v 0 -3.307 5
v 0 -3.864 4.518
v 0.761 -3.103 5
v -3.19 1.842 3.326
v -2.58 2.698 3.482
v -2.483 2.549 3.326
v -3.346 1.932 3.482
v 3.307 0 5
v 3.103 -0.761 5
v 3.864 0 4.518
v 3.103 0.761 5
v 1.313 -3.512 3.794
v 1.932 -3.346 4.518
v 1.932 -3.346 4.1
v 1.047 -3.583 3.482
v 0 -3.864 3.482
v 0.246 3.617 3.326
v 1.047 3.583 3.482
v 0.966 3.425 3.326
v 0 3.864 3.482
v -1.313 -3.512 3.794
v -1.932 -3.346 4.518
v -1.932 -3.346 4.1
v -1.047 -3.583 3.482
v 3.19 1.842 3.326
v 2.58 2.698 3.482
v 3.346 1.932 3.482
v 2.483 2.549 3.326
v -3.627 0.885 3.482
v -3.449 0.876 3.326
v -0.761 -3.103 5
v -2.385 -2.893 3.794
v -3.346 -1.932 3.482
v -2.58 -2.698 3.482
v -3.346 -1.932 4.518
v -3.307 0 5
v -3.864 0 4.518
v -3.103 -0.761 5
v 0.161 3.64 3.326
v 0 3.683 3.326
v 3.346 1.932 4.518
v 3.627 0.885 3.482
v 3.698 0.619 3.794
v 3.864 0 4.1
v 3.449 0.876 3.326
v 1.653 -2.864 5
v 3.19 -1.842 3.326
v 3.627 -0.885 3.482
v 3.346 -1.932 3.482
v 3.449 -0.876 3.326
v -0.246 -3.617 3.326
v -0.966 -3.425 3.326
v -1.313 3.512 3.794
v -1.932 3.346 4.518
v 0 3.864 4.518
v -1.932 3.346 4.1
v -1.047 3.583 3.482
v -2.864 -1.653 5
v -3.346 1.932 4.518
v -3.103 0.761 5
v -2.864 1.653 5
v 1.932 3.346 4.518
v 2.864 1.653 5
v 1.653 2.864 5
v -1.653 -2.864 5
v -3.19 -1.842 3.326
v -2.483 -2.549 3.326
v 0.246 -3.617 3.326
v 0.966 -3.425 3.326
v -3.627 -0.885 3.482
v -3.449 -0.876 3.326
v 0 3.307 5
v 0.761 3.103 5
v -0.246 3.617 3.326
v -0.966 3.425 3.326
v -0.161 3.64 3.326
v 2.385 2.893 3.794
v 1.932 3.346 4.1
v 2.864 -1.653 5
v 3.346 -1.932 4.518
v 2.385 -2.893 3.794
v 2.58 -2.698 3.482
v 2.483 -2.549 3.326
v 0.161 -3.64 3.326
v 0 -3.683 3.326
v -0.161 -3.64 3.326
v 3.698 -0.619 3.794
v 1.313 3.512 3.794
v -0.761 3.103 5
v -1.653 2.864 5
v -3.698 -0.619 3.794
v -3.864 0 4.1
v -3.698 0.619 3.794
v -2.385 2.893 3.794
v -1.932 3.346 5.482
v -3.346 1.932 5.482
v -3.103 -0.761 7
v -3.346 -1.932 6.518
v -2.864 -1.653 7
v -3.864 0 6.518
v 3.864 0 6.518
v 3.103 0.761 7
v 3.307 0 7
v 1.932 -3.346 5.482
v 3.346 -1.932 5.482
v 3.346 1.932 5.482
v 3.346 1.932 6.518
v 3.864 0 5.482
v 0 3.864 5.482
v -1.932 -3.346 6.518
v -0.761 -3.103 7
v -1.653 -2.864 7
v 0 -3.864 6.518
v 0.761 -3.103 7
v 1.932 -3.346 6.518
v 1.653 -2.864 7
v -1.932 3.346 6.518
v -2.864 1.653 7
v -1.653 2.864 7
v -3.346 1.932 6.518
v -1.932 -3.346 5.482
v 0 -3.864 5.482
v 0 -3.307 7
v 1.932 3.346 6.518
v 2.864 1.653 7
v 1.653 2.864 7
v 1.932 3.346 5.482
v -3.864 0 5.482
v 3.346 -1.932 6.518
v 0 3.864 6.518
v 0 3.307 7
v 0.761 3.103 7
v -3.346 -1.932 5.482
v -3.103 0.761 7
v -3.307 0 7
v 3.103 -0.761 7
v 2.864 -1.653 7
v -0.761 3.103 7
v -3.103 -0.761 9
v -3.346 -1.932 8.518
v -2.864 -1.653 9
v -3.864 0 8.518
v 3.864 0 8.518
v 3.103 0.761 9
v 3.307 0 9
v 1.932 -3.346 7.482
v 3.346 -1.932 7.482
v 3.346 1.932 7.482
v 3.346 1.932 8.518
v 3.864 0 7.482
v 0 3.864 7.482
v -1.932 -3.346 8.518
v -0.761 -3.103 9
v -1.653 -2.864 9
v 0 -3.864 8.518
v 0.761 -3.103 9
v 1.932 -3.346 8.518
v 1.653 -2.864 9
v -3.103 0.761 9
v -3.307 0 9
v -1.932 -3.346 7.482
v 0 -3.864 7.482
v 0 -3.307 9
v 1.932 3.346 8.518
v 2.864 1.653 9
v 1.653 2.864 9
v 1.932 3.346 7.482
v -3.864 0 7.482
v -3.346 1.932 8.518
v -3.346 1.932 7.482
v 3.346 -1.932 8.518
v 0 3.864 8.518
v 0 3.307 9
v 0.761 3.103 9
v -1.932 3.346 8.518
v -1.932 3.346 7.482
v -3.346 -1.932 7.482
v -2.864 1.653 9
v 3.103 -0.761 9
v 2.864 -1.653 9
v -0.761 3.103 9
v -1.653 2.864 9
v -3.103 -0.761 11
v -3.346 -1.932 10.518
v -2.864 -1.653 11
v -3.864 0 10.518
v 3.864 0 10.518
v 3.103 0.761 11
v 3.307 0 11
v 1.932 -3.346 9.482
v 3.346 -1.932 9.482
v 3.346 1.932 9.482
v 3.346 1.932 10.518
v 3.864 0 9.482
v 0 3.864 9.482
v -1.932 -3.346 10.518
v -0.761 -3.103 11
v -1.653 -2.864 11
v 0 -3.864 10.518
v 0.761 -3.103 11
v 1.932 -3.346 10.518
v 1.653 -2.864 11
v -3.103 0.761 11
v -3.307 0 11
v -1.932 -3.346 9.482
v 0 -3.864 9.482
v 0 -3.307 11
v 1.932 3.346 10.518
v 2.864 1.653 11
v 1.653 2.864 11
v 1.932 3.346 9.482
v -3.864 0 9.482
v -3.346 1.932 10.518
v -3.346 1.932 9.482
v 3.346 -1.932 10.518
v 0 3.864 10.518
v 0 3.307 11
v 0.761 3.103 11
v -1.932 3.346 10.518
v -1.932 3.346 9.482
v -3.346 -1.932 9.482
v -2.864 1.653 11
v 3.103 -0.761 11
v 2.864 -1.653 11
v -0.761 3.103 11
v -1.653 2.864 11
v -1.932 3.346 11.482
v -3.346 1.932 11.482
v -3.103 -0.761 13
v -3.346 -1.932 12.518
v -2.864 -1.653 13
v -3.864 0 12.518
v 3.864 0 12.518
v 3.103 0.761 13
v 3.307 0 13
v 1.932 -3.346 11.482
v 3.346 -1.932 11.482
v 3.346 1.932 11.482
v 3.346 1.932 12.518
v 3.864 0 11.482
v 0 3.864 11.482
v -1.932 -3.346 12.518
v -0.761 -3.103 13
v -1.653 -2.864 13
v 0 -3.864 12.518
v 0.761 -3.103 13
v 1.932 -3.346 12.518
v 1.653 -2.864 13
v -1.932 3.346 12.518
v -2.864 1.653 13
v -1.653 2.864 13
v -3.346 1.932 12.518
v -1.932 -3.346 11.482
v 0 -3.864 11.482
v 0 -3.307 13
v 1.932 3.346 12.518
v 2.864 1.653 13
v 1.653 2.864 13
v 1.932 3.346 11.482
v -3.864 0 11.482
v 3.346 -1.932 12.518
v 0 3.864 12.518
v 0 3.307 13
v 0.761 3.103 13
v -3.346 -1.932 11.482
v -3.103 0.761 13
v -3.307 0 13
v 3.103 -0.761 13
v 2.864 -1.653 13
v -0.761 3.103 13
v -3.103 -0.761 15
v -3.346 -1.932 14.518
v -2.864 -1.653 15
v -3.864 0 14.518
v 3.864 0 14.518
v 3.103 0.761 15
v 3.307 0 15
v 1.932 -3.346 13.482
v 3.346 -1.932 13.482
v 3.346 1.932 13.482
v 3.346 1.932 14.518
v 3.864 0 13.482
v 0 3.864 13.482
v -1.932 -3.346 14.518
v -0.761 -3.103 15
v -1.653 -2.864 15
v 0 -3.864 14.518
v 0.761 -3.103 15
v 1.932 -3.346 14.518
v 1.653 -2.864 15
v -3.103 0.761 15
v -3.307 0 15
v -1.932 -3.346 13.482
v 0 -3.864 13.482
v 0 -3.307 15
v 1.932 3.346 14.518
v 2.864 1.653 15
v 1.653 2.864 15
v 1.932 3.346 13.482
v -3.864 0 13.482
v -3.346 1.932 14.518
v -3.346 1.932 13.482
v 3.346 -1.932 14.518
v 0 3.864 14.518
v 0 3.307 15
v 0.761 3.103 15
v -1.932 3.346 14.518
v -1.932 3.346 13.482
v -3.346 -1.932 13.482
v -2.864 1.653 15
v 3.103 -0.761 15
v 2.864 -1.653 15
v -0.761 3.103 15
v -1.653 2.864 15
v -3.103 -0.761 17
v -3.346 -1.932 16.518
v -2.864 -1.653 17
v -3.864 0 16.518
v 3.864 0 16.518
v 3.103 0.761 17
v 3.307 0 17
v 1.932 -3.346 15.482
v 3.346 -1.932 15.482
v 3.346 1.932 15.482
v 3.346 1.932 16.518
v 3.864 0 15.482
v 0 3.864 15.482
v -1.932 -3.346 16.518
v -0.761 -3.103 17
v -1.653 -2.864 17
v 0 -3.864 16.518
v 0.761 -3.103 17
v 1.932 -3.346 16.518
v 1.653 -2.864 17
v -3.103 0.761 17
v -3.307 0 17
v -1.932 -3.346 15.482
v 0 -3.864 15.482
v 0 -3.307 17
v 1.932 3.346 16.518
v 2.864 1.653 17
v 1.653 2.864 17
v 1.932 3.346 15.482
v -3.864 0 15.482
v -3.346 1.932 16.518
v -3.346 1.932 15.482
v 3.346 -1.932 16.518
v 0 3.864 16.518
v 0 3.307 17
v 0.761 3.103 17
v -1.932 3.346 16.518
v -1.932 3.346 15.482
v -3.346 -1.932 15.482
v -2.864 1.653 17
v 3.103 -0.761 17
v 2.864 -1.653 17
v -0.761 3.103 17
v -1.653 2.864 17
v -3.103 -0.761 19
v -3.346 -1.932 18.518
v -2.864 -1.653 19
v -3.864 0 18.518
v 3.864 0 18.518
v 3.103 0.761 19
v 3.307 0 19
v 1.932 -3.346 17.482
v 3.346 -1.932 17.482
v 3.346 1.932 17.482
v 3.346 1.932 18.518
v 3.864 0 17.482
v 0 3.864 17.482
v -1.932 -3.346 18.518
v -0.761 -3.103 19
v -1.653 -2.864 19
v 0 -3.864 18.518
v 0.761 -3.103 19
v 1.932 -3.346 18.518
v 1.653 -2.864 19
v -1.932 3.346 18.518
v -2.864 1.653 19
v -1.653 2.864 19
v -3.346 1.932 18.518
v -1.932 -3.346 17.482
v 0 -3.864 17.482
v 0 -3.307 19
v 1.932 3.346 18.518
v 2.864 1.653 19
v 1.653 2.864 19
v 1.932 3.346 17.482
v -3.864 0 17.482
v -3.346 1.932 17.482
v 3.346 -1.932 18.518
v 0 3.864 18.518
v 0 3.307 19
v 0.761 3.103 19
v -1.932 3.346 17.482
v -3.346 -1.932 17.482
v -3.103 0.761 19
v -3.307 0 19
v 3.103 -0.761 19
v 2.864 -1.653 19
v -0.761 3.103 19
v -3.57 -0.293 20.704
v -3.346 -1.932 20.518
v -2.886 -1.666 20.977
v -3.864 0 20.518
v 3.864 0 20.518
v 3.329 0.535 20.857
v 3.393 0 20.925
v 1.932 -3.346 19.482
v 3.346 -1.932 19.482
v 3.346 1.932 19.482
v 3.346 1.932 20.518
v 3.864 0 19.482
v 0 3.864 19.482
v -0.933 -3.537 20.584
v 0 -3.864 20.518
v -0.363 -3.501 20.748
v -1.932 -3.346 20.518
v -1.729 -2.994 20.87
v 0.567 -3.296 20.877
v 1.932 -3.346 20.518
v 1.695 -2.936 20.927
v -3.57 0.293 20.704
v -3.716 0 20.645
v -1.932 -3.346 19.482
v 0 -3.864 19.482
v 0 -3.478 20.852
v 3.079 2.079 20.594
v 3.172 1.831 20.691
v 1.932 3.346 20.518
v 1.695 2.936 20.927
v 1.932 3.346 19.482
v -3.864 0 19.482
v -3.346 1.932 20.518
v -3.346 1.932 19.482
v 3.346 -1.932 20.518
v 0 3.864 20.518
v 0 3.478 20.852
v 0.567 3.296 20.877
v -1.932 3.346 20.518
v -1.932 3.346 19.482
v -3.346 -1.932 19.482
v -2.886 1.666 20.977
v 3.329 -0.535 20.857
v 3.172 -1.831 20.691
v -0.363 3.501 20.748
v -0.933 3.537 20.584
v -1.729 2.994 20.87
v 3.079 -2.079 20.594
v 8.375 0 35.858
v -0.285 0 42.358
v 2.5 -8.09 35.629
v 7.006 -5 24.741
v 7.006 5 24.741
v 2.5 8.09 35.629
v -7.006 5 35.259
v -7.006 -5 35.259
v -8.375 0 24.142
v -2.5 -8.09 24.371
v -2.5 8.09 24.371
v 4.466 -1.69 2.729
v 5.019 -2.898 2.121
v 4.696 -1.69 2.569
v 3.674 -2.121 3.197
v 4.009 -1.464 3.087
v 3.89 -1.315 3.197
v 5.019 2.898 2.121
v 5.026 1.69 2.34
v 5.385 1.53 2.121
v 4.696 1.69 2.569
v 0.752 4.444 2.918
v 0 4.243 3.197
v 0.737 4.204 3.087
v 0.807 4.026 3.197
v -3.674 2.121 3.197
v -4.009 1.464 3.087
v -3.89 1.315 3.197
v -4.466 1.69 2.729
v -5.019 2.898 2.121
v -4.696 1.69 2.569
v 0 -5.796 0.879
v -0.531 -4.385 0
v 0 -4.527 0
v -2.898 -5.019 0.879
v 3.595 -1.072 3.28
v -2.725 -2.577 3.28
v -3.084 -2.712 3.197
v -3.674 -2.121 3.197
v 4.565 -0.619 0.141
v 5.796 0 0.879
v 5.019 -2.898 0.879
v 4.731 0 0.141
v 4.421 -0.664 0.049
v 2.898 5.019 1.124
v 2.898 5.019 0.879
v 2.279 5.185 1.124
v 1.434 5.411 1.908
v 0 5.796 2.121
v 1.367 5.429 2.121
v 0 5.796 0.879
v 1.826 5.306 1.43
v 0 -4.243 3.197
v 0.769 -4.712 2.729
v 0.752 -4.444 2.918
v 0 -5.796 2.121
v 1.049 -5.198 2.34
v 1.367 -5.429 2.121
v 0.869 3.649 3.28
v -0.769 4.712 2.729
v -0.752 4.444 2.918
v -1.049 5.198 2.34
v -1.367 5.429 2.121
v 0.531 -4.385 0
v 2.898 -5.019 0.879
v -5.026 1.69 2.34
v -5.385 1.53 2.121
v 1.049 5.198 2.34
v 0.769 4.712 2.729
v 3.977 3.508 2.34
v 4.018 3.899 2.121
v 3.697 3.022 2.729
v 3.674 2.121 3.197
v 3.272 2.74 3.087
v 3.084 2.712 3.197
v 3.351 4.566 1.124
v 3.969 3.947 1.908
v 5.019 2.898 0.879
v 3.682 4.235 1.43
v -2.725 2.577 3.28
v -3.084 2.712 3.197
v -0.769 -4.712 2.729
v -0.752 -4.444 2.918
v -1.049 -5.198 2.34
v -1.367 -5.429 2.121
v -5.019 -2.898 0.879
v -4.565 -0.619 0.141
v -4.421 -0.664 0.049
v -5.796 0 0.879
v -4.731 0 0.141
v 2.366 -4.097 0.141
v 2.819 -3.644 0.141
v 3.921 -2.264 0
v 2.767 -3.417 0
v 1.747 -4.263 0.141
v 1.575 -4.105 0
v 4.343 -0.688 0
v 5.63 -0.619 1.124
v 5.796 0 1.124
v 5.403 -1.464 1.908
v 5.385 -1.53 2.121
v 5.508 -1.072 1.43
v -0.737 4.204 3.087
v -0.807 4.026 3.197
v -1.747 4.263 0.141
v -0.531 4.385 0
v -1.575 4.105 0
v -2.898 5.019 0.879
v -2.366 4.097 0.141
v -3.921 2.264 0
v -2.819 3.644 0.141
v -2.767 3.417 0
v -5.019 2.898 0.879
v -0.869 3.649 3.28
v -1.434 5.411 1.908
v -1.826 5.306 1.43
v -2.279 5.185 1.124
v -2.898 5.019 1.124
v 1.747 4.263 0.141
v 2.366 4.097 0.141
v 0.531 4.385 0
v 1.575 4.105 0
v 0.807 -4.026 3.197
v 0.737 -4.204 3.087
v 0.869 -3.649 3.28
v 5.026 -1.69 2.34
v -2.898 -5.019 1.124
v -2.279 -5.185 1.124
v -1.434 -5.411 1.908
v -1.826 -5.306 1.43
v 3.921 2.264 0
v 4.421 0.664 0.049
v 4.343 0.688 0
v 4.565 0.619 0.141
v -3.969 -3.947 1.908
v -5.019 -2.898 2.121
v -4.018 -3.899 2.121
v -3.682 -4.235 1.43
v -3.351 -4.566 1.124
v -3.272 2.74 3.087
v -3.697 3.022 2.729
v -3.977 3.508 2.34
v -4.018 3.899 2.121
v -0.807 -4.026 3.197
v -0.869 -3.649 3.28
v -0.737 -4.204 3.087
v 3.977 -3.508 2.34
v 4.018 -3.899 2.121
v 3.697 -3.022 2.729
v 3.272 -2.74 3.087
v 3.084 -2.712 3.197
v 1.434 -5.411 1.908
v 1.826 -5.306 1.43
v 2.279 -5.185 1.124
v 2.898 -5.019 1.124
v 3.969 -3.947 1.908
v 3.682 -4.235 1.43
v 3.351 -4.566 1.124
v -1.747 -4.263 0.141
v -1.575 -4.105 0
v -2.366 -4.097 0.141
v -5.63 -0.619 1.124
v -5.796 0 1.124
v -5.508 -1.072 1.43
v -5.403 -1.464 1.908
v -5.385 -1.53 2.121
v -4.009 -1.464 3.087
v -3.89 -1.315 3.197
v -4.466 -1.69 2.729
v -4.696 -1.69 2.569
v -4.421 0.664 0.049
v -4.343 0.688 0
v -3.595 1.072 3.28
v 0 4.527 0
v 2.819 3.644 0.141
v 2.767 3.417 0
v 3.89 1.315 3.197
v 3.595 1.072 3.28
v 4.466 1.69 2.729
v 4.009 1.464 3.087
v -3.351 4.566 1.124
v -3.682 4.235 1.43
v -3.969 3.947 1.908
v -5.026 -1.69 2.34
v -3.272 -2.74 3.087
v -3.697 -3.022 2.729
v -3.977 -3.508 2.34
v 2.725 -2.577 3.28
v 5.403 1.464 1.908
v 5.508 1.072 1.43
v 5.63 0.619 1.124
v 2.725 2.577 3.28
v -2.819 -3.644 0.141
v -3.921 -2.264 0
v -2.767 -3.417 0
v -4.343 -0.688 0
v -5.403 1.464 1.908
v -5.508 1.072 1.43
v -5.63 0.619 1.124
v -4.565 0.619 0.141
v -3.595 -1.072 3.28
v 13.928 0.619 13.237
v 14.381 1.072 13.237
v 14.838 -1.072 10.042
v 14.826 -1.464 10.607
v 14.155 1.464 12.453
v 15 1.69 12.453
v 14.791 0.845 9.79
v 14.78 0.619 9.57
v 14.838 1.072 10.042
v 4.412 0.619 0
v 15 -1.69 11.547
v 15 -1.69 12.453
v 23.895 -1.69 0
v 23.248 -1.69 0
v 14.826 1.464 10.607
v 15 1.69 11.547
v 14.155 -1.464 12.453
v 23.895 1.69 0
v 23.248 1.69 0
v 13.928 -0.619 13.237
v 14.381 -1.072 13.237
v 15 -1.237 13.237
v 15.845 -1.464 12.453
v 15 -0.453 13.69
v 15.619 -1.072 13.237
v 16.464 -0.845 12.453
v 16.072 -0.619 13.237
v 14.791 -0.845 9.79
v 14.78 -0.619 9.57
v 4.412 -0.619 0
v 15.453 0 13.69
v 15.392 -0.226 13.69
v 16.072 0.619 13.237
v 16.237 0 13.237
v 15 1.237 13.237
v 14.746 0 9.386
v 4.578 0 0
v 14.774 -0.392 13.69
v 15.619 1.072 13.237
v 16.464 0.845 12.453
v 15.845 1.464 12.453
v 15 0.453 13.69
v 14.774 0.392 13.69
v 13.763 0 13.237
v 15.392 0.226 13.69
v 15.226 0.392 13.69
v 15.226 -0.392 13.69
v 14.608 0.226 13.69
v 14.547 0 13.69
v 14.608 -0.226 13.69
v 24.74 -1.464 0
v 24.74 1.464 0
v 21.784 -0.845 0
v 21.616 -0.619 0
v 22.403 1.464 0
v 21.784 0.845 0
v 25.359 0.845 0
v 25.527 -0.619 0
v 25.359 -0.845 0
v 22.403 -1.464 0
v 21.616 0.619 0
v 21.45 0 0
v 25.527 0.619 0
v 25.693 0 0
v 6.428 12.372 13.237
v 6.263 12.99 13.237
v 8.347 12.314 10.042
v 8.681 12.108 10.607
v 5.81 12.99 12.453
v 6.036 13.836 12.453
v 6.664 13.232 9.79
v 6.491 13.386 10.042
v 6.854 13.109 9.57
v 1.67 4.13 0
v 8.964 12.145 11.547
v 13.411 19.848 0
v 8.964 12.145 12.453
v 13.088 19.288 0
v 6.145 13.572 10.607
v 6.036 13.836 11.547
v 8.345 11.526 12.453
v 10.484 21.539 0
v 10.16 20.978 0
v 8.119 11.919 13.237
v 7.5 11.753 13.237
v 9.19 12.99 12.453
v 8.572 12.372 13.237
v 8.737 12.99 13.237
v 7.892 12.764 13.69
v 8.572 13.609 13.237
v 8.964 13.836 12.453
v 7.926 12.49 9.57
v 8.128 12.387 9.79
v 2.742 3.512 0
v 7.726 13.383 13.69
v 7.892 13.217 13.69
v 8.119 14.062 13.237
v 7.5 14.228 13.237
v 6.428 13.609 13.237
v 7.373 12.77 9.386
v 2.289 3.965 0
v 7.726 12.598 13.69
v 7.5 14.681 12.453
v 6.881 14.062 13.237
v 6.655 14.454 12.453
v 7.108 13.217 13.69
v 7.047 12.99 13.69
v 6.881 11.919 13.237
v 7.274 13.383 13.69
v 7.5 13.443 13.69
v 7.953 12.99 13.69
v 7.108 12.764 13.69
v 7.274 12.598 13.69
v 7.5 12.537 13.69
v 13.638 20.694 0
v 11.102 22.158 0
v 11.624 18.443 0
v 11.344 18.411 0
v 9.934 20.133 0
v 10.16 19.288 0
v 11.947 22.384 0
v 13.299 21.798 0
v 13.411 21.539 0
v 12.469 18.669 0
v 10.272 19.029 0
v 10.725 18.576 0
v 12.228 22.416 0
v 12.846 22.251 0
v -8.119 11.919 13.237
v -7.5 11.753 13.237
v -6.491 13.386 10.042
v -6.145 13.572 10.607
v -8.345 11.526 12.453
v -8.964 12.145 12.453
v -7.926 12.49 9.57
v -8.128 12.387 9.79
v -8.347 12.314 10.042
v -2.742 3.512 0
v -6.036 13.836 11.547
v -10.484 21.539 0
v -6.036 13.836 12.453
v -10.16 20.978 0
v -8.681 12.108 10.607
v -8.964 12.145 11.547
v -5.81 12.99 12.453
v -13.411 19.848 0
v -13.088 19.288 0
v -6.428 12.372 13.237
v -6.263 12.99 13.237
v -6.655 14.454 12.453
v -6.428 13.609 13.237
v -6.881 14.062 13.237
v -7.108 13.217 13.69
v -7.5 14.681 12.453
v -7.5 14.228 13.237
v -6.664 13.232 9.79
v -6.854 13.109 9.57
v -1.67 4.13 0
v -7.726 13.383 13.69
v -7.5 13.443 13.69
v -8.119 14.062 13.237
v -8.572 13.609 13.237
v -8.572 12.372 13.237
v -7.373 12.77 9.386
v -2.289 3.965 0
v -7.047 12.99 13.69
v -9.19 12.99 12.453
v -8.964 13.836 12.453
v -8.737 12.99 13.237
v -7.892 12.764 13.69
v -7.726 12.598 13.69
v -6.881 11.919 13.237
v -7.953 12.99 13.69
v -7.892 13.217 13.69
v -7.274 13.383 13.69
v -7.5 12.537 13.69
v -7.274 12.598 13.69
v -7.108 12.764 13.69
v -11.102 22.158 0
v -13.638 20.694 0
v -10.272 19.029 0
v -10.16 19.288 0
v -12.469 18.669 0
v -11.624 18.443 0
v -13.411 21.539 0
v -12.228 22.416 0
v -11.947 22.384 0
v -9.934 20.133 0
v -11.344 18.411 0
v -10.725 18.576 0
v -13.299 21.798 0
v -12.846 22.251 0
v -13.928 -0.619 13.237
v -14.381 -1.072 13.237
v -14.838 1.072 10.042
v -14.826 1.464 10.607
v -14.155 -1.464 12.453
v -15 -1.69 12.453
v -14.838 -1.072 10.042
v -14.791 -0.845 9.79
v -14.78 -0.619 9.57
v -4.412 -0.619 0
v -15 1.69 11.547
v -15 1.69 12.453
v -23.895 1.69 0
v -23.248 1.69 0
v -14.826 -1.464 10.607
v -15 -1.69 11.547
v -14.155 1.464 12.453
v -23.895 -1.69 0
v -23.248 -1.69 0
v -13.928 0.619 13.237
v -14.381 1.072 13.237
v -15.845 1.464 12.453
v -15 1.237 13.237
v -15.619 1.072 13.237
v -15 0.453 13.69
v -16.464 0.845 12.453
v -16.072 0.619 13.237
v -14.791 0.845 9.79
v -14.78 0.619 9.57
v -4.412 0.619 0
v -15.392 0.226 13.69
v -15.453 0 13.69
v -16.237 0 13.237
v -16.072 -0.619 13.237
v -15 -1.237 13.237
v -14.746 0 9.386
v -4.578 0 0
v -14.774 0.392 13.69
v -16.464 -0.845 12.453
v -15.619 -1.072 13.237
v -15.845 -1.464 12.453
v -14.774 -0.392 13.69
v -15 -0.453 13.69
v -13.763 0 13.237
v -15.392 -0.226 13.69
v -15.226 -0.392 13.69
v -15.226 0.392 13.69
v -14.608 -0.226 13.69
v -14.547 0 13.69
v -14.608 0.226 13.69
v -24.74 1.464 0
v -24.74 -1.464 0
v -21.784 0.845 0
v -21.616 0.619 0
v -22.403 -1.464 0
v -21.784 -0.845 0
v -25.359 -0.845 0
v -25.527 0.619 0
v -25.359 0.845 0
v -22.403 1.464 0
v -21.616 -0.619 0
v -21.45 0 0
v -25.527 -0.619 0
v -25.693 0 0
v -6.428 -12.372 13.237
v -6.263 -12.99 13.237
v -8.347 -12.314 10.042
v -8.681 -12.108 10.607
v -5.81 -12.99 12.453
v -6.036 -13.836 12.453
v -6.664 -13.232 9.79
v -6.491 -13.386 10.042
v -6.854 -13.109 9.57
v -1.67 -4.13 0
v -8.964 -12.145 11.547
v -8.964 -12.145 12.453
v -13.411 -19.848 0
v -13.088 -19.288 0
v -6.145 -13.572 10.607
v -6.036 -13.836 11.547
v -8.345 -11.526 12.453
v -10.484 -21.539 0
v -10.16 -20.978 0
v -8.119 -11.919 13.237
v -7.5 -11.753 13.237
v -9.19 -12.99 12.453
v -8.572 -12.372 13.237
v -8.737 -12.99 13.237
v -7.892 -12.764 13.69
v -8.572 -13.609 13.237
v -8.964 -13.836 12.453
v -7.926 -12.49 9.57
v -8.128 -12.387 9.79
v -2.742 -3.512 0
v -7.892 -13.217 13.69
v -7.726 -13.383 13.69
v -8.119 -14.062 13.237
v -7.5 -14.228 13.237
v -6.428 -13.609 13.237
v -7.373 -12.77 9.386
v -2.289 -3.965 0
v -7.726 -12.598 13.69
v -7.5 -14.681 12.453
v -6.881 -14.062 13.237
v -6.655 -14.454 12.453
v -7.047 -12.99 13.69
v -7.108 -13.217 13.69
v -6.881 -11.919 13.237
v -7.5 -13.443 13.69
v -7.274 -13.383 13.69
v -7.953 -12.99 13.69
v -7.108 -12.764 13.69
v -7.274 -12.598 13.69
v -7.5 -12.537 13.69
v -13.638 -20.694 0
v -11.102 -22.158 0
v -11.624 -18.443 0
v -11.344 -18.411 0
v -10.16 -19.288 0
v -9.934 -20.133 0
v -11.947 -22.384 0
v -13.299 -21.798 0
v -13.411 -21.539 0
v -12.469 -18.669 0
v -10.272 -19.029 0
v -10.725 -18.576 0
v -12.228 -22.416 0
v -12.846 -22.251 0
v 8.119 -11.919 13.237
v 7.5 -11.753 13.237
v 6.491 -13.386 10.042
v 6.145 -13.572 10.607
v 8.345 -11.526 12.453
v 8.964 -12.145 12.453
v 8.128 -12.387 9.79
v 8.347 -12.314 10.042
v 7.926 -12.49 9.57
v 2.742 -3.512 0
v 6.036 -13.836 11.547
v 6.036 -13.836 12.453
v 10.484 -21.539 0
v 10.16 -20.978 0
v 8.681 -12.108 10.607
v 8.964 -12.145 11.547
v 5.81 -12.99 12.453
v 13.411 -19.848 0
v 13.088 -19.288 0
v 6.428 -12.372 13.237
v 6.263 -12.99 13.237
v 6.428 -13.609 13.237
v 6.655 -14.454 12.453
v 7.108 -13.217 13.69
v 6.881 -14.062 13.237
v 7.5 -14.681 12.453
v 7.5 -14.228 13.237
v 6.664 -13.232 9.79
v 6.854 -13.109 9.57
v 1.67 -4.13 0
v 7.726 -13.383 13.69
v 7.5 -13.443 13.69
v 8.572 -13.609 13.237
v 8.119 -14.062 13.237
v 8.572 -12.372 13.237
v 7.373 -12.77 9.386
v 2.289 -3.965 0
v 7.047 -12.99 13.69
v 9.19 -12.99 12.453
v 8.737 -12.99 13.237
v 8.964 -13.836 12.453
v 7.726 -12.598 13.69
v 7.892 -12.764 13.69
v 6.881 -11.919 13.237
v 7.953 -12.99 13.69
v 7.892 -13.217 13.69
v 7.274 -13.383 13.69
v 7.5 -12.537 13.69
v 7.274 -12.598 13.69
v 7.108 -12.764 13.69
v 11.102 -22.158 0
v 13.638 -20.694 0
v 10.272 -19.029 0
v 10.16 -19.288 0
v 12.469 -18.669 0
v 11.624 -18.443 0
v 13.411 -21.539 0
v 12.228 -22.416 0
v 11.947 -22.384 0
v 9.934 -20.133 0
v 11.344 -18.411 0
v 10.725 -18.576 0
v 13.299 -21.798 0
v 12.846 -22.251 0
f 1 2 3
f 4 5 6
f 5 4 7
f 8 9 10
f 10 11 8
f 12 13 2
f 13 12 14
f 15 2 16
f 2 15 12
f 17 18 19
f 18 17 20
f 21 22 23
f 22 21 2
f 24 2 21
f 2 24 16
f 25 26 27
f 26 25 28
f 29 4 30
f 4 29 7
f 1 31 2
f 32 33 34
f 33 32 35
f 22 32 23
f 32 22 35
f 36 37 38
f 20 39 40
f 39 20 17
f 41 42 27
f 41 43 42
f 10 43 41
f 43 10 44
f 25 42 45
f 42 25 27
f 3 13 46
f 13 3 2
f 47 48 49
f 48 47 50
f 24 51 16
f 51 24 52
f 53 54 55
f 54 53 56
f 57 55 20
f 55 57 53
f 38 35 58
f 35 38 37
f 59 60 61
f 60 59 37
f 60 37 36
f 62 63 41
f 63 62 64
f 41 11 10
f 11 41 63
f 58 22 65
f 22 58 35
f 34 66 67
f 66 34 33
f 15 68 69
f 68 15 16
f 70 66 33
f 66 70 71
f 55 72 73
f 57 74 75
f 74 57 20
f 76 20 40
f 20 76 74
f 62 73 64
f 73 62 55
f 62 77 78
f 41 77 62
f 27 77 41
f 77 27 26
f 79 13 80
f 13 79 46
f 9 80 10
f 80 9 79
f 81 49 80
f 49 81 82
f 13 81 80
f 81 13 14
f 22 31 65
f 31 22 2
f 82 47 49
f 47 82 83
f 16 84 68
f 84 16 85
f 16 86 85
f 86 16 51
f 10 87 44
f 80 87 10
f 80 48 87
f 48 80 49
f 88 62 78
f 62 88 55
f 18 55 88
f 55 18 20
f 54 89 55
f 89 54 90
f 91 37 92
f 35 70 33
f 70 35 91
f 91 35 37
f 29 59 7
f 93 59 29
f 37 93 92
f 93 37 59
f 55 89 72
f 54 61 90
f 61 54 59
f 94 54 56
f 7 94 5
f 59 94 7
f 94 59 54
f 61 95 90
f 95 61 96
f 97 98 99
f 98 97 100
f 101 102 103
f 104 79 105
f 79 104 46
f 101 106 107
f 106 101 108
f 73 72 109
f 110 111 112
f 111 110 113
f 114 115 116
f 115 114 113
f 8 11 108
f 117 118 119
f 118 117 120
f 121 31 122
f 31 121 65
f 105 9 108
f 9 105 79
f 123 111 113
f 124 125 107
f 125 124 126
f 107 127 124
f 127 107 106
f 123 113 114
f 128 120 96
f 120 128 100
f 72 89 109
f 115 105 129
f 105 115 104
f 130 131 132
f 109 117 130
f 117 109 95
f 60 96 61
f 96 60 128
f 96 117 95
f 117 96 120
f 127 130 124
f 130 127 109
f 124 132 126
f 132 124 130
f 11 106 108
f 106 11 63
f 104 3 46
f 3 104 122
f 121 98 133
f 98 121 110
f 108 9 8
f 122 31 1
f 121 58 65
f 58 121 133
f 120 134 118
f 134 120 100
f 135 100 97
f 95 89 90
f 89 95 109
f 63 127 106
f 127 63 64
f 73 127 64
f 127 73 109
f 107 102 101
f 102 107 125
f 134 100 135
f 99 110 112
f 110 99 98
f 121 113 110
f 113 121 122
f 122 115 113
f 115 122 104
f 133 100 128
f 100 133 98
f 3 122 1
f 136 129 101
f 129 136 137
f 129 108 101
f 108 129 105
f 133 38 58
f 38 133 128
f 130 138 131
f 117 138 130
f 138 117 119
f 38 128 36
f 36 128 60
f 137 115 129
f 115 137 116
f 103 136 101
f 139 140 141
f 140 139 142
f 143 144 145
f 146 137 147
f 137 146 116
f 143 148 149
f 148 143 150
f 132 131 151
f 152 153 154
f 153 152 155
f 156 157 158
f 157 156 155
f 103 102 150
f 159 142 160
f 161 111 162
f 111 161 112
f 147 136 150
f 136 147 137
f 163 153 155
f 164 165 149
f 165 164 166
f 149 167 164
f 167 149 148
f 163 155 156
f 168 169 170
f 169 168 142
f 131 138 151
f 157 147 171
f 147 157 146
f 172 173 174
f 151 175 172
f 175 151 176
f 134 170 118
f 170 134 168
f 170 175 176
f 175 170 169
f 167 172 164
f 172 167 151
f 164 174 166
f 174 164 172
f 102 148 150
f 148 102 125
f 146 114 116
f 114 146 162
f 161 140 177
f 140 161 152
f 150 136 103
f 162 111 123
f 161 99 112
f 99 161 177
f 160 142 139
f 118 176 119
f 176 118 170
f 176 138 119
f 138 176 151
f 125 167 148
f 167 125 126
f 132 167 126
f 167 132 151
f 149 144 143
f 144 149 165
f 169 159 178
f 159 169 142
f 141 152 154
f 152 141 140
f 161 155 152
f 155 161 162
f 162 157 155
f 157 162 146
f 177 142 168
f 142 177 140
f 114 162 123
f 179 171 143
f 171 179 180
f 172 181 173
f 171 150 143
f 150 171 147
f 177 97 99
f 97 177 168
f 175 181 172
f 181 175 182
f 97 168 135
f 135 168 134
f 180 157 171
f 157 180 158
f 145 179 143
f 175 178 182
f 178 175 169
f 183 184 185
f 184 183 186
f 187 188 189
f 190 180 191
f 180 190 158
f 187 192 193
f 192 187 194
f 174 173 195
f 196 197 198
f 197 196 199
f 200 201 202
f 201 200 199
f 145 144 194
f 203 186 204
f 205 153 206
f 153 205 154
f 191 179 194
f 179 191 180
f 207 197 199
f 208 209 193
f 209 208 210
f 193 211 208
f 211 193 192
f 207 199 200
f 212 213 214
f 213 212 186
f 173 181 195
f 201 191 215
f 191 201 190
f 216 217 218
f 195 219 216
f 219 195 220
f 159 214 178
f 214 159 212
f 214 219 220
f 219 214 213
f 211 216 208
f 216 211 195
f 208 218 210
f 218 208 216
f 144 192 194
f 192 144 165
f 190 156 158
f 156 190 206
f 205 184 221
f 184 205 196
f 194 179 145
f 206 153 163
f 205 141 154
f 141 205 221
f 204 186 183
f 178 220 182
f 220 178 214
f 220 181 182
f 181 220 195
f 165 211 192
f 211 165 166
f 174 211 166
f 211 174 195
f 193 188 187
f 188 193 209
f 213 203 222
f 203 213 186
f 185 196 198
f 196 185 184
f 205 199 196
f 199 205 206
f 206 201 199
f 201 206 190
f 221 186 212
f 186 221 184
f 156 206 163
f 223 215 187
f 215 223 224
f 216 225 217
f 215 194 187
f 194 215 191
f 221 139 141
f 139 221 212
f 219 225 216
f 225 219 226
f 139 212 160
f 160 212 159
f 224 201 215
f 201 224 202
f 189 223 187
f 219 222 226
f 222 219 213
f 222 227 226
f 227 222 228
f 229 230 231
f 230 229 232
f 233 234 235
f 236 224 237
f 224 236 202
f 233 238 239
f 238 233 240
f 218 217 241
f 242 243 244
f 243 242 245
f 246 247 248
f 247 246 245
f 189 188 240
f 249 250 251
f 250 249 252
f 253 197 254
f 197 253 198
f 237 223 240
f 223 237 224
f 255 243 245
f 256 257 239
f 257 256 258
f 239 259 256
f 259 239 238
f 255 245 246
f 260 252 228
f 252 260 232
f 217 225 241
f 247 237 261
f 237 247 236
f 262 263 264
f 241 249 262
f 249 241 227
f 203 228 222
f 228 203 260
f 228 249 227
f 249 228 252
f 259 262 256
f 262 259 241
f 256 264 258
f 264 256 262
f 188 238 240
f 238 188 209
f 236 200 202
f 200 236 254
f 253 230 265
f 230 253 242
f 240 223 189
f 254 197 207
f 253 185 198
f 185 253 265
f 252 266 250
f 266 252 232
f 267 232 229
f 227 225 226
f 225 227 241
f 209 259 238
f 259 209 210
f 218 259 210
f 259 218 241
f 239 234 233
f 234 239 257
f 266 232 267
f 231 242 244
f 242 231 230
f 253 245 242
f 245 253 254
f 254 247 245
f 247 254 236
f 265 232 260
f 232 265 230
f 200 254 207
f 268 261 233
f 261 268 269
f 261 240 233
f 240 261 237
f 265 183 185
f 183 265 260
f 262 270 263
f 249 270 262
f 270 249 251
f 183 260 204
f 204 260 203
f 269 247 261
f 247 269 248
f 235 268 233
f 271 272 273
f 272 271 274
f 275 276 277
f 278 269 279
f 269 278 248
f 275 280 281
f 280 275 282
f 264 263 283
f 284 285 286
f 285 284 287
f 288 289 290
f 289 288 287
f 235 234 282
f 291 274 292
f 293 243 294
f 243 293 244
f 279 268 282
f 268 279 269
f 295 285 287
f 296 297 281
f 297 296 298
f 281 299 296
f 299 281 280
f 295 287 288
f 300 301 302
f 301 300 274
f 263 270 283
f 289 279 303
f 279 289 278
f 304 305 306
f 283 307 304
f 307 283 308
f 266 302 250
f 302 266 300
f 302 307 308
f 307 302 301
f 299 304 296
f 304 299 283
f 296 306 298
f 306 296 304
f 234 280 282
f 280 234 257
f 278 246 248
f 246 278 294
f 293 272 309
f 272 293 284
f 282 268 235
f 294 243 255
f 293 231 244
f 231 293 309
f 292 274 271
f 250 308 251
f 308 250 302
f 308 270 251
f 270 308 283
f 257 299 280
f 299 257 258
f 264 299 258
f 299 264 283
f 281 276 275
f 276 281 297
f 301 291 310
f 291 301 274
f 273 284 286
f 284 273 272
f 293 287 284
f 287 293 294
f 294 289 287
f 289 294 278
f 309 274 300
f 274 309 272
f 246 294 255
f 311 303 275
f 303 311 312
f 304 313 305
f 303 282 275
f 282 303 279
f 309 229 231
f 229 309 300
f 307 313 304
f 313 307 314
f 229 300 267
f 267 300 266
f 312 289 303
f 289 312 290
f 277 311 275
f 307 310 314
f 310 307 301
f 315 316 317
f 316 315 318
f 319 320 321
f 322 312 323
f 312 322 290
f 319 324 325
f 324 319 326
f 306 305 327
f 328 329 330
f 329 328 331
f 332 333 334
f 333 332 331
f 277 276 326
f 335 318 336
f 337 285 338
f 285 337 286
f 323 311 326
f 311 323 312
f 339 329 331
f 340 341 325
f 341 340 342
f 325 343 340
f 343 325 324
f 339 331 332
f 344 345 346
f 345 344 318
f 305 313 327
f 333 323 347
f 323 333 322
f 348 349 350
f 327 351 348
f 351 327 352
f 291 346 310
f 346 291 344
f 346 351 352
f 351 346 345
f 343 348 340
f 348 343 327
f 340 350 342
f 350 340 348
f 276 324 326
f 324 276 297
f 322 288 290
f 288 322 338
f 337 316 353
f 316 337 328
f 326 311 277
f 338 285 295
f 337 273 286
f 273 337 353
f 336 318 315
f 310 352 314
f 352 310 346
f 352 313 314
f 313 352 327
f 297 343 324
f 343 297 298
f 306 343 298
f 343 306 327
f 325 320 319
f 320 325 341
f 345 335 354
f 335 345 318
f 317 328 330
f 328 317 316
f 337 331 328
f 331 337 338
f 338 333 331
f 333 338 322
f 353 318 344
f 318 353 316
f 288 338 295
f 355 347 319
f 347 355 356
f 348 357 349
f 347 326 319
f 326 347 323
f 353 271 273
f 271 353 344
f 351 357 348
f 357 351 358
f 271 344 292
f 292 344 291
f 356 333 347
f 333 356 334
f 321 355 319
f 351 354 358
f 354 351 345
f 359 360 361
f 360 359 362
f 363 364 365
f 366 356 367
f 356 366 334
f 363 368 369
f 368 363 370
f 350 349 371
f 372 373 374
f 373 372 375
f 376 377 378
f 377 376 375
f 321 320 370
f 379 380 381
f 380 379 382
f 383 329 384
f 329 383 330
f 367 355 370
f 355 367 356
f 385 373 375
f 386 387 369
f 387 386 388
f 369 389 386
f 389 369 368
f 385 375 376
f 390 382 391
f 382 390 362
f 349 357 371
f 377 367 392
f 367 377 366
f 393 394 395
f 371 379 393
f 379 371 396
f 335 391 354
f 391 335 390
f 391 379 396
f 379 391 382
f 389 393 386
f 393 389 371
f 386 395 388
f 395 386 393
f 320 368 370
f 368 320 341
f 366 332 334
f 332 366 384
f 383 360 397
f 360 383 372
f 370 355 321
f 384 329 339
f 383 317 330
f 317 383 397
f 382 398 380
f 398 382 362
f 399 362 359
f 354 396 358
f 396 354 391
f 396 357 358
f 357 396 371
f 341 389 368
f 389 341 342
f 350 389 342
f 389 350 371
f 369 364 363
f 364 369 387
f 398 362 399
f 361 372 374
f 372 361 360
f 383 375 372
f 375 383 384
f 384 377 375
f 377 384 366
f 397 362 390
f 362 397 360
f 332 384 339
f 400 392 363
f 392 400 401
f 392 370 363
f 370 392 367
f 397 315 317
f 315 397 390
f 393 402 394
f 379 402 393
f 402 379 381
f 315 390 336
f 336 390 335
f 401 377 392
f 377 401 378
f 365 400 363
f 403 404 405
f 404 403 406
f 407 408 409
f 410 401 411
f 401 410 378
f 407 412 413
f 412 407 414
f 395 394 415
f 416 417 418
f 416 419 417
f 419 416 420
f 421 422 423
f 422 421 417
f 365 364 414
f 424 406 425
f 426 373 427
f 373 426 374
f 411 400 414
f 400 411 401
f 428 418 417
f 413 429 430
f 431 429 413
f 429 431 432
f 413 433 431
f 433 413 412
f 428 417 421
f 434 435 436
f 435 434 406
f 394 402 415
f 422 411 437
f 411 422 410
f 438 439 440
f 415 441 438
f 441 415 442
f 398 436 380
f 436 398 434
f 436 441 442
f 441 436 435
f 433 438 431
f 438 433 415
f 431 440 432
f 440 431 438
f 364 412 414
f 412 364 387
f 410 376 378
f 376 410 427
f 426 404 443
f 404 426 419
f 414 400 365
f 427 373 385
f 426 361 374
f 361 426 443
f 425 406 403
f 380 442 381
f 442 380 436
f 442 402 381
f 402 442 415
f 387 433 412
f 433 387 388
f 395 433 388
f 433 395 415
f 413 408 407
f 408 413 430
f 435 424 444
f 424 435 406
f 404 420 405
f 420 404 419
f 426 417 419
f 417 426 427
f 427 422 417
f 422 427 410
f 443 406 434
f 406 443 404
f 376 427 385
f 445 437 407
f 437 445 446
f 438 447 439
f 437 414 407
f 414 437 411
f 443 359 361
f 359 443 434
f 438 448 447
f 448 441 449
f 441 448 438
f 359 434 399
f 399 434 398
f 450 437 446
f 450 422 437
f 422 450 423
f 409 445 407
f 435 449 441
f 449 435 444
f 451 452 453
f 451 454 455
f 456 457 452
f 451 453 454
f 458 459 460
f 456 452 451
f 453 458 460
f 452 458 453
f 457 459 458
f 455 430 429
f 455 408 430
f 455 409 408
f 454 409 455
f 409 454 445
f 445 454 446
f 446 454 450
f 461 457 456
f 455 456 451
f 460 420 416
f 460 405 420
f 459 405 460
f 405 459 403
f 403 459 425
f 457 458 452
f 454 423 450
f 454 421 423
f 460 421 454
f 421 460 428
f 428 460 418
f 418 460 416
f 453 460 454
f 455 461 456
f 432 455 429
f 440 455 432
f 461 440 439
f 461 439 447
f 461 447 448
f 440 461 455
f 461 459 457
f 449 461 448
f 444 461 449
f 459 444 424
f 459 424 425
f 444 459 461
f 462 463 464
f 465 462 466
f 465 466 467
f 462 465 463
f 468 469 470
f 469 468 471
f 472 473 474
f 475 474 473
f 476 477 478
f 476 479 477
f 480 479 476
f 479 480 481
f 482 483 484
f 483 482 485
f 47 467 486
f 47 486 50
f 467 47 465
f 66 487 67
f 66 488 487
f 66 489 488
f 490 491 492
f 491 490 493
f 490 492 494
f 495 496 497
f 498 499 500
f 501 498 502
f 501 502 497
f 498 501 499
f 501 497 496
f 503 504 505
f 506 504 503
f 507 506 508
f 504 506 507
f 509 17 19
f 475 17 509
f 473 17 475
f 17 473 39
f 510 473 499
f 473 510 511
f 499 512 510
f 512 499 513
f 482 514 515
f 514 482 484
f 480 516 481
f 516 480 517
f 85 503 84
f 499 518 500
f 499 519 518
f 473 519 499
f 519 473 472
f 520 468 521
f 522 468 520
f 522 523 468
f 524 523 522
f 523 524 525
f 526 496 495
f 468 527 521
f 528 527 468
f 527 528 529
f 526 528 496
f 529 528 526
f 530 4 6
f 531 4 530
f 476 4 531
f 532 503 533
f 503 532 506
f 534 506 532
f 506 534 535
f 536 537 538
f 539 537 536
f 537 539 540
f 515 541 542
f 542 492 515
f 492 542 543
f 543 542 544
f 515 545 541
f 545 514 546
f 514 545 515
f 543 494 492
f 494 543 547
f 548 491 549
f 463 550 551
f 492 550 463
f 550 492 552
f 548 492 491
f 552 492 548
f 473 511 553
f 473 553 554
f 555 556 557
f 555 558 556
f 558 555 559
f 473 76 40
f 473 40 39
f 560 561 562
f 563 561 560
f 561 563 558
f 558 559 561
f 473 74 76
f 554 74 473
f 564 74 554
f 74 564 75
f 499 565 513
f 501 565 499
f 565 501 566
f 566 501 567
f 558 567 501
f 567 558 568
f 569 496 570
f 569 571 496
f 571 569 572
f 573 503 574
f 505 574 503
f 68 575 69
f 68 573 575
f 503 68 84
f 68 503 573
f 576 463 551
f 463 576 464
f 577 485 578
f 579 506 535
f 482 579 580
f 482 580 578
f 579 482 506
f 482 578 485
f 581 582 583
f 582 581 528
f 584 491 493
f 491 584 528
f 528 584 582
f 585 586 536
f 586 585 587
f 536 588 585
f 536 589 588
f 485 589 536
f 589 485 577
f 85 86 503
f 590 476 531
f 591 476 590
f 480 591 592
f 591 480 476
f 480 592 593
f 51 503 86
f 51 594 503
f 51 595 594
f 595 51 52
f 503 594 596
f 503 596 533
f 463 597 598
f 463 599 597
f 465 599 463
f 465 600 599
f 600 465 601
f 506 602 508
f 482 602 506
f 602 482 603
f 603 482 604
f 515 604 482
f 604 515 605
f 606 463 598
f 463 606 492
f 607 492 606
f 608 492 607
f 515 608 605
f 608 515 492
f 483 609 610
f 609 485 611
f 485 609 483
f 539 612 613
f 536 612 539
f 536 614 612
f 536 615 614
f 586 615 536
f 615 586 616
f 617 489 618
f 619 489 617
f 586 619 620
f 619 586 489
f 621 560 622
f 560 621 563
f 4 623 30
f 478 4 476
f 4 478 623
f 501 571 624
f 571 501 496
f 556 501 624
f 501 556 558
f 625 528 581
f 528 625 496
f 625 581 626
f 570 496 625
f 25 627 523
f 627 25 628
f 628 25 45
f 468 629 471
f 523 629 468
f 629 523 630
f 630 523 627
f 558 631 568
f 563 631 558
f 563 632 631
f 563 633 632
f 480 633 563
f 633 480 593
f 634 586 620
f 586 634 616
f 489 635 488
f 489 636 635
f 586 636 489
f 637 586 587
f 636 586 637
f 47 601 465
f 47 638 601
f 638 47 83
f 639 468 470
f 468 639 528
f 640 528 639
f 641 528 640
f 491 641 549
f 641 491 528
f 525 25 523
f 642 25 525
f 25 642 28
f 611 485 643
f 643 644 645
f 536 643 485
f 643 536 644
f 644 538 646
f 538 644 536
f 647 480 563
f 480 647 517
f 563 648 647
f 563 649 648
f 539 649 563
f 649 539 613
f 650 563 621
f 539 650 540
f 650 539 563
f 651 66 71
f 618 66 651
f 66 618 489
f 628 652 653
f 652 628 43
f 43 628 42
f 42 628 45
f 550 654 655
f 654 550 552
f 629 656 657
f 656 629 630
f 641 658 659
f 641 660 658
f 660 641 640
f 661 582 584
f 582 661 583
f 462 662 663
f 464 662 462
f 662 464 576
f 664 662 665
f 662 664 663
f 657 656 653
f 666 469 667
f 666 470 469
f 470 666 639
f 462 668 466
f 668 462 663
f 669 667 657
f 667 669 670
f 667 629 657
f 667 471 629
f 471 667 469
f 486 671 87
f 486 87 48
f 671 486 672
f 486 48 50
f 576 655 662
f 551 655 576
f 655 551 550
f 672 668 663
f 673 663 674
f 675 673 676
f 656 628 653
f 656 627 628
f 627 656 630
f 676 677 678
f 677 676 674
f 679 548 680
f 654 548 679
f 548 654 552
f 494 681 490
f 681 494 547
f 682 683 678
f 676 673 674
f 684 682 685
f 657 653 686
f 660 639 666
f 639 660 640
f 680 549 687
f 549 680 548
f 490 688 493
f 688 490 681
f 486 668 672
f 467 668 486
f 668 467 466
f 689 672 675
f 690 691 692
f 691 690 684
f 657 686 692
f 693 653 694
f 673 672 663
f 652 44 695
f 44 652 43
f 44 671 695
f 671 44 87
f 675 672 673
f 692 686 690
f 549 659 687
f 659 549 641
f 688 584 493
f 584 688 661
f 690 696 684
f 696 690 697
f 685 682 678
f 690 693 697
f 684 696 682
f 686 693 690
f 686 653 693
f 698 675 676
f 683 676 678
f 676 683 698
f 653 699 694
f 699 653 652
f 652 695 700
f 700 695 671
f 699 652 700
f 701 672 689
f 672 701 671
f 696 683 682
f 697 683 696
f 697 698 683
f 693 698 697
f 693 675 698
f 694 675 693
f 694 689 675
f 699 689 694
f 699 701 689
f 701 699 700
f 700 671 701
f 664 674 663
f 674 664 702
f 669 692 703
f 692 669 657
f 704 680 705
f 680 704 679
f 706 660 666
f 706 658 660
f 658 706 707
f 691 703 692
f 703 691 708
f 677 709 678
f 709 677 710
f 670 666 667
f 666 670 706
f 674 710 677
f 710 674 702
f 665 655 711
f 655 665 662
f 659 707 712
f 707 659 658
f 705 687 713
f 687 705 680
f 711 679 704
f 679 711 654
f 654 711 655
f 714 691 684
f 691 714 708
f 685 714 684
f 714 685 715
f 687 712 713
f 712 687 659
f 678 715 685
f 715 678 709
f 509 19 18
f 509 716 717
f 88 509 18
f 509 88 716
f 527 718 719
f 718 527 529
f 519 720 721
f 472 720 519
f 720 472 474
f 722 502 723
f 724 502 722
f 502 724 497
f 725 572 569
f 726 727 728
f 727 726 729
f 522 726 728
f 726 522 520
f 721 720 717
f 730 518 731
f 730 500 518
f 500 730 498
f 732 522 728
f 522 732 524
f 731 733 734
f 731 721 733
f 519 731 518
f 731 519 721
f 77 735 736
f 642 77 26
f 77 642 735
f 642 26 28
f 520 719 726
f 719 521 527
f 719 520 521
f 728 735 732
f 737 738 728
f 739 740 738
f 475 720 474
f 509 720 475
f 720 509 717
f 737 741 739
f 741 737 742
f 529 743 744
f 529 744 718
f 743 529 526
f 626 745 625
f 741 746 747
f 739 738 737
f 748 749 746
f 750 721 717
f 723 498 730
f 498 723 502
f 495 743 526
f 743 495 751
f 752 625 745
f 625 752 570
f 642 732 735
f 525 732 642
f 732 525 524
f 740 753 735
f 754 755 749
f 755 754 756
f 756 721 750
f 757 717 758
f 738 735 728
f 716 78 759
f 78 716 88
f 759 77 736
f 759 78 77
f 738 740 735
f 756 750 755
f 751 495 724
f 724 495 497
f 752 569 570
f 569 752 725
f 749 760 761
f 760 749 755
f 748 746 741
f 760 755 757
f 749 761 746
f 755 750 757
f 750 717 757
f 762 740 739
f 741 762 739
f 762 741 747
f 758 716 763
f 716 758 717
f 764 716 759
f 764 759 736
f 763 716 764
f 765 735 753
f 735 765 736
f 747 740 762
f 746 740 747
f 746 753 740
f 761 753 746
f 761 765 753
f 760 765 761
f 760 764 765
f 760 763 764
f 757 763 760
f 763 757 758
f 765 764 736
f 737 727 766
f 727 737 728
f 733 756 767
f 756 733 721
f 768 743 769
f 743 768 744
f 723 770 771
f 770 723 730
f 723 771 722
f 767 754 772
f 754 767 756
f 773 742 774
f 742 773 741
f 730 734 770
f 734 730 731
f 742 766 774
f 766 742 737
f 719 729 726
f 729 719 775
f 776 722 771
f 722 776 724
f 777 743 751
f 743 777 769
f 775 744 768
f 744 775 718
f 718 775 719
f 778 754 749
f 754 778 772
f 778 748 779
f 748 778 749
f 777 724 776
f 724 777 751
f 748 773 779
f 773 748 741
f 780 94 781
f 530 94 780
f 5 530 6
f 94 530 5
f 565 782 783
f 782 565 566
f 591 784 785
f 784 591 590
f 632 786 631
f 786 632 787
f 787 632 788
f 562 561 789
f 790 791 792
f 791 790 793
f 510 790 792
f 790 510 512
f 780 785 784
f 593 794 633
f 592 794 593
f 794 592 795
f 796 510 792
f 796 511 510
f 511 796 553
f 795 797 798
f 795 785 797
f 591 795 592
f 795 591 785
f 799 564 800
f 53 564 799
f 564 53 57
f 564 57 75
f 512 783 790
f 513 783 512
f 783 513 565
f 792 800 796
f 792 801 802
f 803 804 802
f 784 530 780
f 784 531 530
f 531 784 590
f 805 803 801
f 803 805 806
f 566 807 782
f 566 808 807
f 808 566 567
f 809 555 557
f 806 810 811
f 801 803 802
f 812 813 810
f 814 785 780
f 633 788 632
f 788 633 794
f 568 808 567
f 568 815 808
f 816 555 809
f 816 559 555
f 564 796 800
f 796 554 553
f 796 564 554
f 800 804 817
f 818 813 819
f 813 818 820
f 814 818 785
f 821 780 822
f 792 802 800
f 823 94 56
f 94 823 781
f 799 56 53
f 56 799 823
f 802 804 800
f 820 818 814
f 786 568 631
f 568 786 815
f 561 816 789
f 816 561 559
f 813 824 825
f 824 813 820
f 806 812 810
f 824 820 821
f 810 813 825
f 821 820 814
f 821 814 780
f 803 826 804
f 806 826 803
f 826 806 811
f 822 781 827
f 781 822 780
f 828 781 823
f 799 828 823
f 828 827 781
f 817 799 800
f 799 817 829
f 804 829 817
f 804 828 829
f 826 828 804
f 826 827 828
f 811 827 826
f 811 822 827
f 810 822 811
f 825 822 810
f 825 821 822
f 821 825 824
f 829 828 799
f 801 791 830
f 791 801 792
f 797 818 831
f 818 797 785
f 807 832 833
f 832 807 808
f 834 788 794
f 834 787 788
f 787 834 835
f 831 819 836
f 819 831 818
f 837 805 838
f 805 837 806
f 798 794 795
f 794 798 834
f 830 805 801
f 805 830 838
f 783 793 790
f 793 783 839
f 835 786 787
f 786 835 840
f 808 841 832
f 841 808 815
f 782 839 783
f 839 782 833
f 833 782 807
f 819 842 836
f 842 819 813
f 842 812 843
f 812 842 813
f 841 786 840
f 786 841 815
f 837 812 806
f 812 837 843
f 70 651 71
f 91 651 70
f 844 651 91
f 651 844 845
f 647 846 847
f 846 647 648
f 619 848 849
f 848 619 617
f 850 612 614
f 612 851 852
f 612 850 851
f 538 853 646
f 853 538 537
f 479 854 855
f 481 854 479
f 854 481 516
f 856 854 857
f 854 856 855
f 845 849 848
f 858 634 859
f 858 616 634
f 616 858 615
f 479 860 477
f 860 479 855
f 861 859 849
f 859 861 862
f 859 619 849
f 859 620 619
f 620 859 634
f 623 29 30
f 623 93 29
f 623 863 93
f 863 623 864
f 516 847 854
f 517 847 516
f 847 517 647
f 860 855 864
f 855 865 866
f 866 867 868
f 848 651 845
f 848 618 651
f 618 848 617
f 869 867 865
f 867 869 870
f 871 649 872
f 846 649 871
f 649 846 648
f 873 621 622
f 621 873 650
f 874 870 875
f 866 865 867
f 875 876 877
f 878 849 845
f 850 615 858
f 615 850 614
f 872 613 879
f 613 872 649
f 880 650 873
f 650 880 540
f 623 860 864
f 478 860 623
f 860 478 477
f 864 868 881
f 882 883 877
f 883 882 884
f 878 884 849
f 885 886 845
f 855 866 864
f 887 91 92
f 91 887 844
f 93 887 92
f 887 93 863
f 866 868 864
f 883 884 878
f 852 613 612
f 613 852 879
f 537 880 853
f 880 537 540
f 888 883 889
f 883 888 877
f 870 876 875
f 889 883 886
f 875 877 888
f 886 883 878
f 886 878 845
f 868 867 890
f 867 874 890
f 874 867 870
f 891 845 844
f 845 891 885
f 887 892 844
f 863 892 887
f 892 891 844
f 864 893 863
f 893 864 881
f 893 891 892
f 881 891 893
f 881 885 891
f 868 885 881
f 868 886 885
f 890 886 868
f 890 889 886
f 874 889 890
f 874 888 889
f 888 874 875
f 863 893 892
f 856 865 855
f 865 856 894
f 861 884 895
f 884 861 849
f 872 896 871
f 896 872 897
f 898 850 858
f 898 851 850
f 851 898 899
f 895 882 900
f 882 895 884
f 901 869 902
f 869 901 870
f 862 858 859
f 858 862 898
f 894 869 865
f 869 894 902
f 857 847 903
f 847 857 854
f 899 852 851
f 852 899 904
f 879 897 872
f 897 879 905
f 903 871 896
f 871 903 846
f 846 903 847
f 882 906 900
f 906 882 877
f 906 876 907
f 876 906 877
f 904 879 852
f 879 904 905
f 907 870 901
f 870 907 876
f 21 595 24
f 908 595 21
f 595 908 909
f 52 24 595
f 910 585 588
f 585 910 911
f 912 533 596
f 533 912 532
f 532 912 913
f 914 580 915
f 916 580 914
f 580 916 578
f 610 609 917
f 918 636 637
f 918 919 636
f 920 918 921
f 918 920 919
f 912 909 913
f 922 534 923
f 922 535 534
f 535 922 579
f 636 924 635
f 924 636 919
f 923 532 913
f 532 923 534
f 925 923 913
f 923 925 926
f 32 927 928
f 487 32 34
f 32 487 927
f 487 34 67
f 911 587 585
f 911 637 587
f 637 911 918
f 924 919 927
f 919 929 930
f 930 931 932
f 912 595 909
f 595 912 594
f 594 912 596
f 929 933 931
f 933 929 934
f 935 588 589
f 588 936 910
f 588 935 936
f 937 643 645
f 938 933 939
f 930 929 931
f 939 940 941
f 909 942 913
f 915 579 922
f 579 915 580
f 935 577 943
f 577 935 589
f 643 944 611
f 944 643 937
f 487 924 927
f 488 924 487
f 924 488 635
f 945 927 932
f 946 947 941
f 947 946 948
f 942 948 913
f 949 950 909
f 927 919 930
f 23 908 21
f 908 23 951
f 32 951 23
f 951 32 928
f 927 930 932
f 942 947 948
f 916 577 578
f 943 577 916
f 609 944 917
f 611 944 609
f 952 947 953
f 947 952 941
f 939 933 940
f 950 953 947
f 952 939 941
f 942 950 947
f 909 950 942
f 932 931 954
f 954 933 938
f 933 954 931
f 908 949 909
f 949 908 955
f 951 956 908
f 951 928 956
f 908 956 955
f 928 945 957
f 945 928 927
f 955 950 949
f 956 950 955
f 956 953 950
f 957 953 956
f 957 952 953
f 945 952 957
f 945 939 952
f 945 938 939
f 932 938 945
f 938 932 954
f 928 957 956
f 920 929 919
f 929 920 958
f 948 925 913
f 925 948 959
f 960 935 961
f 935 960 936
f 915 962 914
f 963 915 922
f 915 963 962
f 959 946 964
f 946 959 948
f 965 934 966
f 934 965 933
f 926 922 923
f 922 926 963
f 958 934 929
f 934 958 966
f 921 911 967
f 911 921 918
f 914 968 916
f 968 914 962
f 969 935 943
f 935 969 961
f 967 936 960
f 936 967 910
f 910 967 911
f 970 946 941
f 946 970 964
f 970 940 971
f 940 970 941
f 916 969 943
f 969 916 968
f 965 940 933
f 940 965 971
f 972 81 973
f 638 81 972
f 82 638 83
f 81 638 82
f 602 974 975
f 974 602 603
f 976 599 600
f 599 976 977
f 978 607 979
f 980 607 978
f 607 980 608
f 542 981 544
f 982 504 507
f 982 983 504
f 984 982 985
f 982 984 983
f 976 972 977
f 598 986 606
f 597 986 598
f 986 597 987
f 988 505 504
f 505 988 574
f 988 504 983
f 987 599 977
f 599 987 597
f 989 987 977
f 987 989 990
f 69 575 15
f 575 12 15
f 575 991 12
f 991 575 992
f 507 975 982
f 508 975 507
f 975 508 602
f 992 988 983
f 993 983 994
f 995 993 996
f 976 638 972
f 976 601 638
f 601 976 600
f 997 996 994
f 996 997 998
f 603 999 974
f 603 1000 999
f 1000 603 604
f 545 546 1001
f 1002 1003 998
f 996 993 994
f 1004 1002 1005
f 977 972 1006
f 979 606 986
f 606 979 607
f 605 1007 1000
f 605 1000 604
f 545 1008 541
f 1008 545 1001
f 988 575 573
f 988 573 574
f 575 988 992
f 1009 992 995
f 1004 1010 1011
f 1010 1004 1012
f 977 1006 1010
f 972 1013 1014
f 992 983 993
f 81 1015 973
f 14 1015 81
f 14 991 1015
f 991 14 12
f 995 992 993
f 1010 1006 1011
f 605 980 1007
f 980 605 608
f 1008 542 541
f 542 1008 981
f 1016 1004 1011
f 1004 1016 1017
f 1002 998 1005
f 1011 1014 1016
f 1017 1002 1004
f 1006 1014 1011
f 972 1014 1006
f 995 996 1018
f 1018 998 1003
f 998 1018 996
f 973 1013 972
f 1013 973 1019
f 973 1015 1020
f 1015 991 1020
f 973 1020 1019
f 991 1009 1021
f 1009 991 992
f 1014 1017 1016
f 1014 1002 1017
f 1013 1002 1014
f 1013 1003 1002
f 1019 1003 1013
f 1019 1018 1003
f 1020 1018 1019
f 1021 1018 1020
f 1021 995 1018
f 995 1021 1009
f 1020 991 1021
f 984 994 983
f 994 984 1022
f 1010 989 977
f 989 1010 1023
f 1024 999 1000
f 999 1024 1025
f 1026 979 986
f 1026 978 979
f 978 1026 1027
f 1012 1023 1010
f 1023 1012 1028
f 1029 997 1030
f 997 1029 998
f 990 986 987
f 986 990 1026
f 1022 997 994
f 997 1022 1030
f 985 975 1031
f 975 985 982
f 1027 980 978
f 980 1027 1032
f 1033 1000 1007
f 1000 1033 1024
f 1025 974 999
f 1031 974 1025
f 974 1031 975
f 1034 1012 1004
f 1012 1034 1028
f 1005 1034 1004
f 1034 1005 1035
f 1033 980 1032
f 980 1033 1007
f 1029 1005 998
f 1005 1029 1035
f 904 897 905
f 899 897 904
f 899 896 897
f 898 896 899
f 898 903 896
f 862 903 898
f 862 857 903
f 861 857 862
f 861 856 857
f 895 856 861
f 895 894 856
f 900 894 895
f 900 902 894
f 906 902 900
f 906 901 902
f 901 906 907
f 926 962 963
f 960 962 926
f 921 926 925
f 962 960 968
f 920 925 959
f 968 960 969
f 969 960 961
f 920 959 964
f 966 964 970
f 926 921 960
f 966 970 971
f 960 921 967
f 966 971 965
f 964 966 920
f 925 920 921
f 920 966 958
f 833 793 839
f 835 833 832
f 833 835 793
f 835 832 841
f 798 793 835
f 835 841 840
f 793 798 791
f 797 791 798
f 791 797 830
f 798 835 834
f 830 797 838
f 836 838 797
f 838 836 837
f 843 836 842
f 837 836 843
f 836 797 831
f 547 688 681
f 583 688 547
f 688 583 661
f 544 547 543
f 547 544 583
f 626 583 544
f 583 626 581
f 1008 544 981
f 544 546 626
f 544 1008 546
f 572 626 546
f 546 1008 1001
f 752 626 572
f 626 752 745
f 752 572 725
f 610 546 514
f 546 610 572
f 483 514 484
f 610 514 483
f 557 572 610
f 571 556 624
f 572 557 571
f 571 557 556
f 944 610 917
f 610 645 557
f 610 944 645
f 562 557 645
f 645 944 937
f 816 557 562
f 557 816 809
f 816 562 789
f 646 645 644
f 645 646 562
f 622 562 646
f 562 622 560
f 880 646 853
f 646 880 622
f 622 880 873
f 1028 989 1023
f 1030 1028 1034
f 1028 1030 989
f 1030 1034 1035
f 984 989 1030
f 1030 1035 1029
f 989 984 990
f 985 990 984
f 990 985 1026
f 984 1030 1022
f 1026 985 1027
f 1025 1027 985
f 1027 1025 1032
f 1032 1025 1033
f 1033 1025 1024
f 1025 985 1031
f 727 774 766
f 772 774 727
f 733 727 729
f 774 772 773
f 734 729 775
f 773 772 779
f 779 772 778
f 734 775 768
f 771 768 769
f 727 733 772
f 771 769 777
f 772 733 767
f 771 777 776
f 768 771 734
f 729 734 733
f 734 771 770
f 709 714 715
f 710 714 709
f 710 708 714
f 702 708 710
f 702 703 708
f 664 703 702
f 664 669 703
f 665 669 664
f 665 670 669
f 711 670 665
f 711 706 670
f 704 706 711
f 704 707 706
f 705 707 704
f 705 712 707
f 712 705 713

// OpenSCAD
    // Bacteriophage by Erik Wrenholt 2017-02-12
// License: Creative Commons - Attribution

$fn = 12;

leg_count = 6;
leg_width = 1.75;

printable_phage();

module printable_phage() {
    // chop off the bottom of the legs so they are flat on the bottom.
    difference() {
        bacteriophage();
        translate([0,0,-5]) cube([100,100,10], center=true);
    }
}

module bacteriophage() {
    body();
    for(i=[0:leg_count]) {
        rotate((360 / leg_count) * i, [0,0,1])
            leg();
    }
 }

module body() {
    
    // Icosahedral head
    translate([0,0,30]) 
    scale([1,1,1.3])
        rotate(30, [0,1,0]) 
                icosahedron(5);
    
    // Base-Plate
    translate([0,0,1.5])
        scale([1,1,0.4])
            rotate(30, [0,0,1])
                sphere(6, $fn=12);

    // Helical Sheath
    for(i=[2:10]) {
        translate([0,0,i*2])
            scale([1,1,0.5])
                sphere(4);
    }

}

module leg() {
    union() {
        hull() {
            translate([2,0,0]) sphere(leg_width);
            translate([15,0,12]) sphere(leg_width);
        }
        hull() {
            translate([15,0,12]) sphere(leg_width);
            translate([25,0,-2]) sphere(leg_width);
        }
    }
}


// https://www.thingiverse.com/thing:1343285

/*****************************************************************
* Icosahedron   By Adam Anderson
* 
* This module allows for the creation of an icosahedron scaled up 
* by a factor determined by the module parameter. 
* The coordinates for the vertices were taken from
* http://www.sacred-geometry.es/?q=en/content/phi-sacred-solids
*************************************************************/

module icosahedron(a = 2) {
    phi = a * ((1 + sqrt(5)) / 2);
    polyhedron(
        points = [
            [0,-phi, a], [0, phi, a], [0, phi, -a], [0, -phi, -a], [a, 0, phi], [-a, 0, phi], [-a, 0, -phi], 
            [a, 0, -phi], [phi, a, 0], [-phi, a, 0], [-phi, -a, 0], [phi, -a, 0]    
        ],
        faces = [
            [0,5,4], [0,4,11], [11,4,8], [11,8,7], [4,5,1], [4,1,8], [8,1,2], [8,2,7], [1,5,9], [1,9,2], [2,9,6], [2,6,7], [9,5,10], [9,10,6], [6,10,3], [6,3,7], [10,5,0], [10,0,3], [3,0,11], [3,11,7]
        ]
    
    );
}
    
